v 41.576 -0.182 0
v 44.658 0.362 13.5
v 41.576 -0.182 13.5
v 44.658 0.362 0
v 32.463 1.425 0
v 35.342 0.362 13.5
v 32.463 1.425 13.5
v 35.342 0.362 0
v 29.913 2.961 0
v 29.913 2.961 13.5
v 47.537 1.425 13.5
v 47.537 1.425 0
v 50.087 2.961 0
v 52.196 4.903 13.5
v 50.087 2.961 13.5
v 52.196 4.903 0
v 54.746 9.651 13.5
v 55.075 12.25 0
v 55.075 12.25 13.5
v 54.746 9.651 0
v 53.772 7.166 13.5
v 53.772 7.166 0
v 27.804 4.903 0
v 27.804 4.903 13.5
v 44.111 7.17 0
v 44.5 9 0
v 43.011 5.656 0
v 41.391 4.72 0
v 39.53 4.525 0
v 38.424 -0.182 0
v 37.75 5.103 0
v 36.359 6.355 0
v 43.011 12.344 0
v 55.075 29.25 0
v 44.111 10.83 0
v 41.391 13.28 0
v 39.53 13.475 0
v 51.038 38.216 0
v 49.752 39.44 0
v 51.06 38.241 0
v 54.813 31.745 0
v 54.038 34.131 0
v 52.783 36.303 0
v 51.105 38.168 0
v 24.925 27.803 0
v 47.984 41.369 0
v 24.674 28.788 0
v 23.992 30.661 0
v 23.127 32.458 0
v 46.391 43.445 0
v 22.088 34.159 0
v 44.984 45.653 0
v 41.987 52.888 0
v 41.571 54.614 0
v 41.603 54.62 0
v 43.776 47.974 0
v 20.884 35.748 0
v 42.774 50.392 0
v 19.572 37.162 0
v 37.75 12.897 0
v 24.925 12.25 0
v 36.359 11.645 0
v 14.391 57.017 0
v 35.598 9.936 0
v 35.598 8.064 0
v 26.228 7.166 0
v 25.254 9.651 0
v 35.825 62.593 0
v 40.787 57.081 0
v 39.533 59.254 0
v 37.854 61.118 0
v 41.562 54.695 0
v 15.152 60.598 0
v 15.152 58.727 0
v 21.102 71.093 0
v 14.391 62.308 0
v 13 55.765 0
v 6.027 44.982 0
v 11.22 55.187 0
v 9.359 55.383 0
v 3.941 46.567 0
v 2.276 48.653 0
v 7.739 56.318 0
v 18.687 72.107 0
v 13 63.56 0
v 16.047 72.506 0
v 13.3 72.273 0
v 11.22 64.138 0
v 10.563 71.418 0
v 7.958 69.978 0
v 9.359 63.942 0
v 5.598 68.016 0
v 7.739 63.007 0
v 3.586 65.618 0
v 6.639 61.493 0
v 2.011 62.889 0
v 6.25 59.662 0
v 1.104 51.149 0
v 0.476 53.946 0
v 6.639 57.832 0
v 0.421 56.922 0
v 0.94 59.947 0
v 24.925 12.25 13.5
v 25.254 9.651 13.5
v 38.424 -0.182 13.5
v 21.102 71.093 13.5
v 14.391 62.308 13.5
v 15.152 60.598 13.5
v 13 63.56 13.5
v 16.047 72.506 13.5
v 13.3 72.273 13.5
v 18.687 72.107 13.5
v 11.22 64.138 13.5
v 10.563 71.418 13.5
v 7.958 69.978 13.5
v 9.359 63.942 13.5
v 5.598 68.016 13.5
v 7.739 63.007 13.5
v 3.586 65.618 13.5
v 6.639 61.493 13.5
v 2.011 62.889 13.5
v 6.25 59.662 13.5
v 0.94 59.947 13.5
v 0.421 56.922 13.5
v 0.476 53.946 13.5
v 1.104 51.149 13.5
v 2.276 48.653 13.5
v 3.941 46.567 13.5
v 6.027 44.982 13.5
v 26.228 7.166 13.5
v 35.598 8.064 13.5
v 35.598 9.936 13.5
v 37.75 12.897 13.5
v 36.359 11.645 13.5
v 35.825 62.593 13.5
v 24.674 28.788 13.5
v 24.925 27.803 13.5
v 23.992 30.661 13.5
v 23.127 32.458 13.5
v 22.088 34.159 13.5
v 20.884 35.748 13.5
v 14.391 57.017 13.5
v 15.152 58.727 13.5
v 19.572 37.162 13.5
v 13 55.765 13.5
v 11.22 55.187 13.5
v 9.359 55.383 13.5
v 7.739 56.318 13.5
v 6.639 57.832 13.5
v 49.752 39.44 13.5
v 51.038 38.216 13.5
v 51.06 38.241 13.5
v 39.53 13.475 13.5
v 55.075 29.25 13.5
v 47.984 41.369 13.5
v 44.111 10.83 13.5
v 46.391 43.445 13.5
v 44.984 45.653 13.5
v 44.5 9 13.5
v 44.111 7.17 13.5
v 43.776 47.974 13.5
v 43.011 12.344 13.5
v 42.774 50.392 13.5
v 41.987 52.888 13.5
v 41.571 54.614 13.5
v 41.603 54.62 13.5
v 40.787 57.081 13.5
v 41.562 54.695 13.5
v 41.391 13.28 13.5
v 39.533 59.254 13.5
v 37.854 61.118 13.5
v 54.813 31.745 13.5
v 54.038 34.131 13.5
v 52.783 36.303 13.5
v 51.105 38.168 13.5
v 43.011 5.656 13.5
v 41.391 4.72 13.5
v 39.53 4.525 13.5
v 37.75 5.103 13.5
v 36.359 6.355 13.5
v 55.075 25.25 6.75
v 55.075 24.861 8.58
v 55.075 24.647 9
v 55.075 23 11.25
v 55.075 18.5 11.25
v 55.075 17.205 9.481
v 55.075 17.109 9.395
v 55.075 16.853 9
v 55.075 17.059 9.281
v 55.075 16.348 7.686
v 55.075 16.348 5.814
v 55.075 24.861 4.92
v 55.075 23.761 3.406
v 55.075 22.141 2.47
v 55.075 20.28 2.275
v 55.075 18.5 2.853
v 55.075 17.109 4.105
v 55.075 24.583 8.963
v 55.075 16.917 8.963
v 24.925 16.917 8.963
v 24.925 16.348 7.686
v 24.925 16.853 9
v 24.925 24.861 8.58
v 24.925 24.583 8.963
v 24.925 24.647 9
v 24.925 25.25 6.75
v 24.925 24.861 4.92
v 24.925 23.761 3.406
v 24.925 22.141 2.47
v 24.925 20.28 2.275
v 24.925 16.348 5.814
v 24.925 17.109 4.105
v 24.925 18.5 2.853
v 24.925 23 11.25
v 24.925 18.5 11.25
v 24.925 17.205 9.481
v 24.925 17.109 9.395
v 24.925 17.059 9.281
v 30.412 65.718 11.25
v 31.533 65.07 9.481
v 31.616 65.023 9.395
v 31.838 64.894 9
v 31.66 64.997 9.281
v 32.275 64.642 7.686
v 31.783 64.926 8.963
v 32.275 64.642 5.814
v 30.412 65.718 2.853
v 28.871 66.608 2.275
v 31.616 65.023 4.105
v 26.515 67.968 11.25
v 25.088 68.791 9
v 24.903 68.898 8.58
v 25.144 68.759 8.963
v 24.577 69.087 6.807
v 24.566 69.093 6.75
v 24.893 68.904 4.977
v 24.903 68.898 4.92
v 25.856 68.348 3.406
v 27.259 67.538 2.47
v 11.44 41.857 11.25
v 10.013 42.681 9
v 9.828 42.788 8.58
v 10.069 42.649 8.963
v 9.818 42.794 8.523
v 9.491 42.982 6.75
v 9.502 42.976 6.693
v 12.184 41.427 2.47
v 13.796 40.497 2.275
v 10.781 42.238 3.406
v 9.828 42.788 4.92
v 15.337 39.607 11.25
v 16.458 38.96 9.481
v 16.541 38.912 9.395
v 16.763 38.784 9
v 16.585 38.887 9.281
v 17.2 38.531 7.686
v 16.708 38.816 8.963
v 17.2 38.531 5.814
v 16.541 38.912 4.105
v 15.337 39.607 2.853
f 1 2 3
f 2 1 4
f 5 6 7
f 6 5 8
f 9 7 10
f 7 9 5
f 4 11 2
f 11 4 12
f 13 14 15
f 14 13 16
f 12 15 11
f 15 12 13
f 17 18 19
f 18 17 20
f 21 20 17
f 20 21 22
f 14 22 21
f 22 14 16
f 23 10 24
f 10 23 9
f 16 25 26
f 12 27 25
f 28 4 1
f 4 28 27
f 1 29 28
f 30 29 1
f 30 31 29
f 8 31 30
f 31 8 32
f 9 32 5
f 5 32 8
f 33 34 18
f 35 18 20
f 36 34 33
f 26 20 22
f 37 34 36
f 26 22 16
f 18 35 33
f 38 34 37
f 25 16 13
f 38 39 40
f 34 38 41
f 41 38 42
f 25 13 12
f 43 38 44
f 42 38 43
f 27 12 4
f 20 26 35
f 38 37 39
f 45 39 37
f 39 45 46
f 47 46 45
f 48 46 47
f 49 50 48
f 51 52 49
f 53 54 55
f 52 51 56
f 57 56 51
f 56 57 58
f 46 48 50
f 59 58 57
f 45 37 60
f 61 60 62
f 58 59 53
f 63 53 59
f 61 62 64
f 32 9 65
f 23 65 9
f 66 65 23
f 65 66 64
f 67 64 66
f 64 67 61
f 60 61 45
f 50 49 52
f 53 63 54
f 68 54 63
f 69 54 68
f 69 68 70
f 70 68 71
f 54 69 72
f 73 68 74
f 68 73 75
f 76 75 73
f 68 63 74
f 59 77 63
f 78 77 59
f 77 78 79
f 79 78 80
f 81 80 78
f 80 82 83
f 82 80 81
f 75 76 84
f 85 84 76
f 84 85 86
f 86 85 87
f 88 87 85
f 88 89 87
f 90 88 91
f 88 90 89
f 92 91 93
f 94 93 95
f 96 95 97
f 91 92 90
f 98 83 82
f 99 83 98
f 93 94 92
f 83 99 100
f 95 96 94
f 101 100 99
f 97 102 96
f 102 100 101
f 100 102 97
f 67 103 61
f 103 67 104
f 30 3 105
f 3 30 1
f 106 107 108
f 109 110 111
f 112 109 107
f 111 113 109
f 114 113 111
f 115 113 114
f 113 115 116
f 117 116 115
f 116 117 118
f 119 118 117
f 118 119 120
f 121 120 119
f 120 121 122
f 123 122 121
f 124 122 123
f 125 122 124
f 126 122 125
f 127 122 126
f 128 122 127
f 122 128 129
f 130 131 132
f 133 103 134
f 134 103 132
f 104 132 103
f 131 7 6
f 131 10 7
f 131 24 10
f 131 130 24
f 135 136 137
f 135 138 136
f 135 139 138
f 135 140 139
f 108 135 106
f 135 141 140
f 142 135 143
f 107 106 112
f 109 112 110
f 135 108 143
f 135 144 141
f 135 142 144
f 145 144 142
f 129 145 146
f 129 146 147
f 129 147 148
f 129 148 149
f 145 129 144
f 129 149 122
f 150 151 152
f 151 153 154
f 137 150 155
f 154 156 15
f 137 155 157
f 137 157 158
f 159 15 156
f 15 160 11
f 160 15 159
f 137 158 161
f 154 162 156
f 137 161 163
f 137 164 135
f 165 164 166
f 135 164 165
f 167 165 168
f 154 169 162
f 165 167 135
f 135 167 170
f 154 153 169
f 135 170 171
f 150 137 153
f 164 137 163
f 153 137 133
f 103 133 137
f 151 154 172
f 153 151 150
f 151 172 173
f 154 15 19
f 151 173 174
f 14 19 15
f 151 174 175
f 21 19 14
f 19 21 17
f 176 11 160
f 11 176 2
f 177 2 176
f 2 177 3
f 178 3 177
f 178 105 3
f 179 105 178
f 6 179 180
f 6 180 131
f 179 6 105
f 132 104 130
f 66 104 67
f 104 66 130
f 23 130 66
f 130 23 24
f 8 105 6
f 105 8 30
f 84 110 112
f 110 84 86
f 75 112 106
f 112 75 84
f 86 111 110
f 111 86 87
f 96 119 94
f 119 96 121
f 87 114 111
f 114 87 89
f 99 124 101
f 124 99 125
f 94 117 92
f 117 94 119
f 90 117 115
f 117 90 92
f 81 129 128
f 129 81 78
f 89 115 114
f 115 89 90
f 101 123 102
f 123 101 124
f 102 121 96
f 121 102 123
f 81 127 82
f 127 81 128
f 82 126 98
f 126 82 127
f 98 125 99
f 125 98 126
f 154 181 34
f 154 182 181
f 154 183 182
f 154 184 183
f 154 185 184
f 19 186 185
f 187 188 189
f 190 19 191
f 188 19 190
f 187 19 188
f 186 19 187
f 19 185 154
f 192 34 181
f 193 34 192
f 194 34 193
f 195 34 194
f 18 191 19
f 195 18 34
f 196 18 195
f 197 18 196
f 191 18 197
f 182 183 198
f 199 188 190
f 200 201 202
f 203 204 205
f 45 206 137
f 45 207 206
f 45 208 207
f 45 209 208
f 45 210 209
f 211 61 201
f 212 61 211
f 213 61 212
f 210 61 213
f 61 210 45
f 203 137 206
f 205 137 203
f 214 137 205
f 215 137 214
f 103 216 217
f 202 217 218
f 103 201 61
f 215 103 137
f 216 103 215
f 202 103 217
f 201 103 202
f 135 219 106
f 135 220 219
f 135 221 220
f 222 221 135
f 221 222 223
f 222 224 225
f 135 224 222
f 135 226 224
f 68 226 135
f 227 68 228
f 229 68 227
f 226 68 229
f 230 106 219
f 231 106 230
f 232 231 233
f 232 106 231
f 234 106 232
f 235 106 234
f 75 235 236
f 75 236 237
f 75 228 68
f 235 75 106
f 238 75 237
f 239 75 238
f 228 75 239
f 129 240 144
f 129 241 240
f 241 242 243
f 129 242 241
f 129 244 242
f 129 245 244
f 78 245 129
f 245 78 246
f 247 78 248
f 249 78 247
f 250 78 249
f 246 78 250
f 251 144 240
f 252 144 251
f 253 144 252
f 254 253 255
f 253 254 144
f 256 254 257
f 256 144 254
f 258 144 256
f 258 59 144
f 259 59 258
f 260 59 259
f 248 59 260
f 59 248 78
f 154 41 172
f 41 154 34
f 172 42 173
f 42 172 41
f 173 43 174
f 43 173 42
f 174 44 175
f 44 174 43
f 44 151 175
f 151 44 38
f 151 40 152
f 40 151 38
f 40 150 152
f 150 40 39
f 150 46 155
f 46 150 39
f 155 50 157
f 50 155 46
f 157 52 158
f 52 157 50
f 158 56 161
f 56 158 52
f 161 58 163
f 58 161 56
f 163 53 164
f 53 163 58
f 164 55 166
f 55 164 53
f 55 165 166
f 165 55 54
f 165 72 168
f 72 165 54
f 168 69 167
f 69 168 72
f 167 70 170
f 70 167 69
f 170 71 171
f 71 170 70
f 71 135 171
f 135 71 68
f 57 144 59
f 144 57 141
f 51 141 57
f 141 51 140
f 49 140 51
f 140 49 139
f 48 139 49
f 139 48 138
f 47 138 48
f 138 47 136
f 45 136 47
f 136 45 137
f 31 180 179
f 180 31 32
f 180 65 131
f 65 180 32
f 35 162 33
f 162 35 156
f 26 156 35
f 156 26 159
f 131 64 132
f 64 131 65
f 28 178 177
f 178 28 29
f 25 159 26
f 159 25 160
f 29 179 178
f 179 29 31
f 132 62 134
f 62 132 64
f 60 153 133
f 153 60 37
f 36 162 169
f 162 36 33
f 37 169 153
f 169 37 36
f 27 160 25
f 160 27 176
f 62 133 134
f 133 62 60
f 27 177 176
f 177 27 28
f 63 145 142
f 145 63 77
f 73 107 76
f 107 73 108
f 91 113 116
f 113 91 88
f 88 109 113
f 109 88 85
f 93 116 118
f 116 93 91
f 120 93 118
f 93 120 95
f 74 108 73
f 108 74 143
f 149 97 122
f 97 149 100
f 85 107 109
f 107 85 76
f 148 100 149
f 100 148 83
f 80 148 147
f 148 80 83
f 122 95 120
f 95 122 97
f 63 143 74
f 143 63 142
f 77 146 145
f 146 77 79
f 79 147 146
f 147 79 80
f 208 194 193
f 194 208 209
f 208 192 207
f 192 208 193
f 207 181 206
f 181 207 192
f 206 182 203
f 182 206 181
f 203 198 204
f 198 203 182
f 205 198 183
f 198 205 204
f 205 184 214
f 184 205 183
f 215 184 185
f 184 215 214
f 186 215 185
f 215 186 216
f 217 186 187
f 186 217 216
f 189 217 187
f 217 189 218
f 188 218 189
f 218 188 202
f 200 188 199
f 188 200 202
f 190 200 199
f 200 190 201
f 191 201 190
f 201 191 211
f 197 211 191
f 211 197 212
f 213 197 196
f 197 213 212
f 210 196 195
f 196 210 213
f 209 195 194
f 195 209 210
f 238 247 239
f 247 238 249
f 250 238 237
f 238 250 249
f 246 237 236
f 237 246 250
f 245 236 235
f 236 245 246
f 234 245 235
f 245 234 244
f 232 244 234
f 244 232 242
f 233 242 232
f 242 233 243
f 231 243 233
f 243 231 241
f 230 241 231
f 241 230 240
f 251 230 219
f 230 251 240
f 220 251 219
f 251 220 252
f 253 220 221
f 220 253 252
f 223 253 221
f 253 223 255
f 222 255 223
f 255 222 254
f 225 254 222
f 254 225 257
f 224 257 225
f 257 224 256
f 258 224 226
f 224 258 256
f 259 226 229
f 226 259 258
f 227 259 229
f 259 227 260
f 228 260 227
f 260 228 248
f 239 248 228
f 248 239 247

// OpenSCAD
// file: functions.scad
// PRUSA Mendel  
// Functions used in many files
// GNU GPL v2
// Josef Průša
// josefprusa@me.com
// prusadjs.cz
// http://www.reprap.org/wiki/Prusa_Mendel
// http://github.com/prusajr/PrusaMendel

module nut( d, h, horizontal = true )
{
	cornerdiameter = ( d / 2 ) / cos( 180 / 6 );
	cylinder( h = h, r = cornerdiameter, $fn = 6 );
	if( horizontal )
	{
		for( i = [1 : 6] )
		{
			rotate( [0, 0, 60 * i] ) translate( [-cornerdiameter - 0.2, 0, 0] ) rotate( [0, 0, -45] ) cube( size = [2, 2, h] );
		}
	}
}

// By nophead
module polyhole( d, h ) 
{
	n = max( round( 2 * d ), 3 );
	rotate( [0, 0, 180] ) cylinder( h = h, r = ( d / 2 ) / cos( 180 / n ), $fn = n );
}

module roundcorner( diameter )
{
	difference()
	{
		cube( size = [diameter, diameter, 99], center = false );
		translate( v = [diameter, diameter, 0] ) cylinder( h = 100, r = diameter, center = true );
	}
}
// file: metric.scad
// PRUSA Mendel  
// Default metric sizes
// GNU GPL v2
// Josef Průša
// josefprusa@me.com
// prusadjs.cz
// http://www.reprap.org/wiki/Prusa_Mendel
// http://github.com/prusajr/PrusaMendel

// DONT CHANGE THIS FILE! ALTER VALUES IN CONFIGURATION.SCAD INSTEAD

// RODS

threaded_rod_diameter = 8.2;
threaded_rod_diameter_horizontal = 8.2;
smooth_bar_diameter = 8;
smooth_bar_diameter_horizontal = 8.5;

// Nuts and bolts

m8_diameter = 9;
m8_nut_diameter = 16.4;

m4_diameter = 4.5;
m4_nut_diameter = 9;

m3_diameter = 3.6;
m3_nut_diameter = 6.1;

// Bushing holder

bushing_core_diameter = smooth_bar_diameter;
bushing_material_thickness = 1;

// Motors

motor_shaft = 5.5;
// file: configuration.scad
// PRUSA Mendel  
// Configuration file
// GNU GPL v2
// Josef Průša
// josefprusa@me.com
// prusadjs.cz
// http://www.reprap.org/wiki/Prusa_Mendel
// http://github.com/prusajr/PrusaMendel

// PLEASE SELECT ONE OF THE CONFIGURATIONS BELOW
// BY UN-COMMENTING IT

// Uncomment for metric settings
// METRIC METRIC METRIC METRIC METRIC METRIC METRIC METRIC 

include <metric.scad>;

// Uncomment for imperial settings
// IMPERIAL IMPERIAL IMPERIAL IMPERIAL IMPERIAL IMPERIAL IMPERIAL 

//include <sae.scad>;

// CUSTOM CUSTOM CUSTOM CUSTOM CUSTOM CUSTOM CUSTOM CUSTOM CUSTOM

// Thin walls
layer_height = 0.3;
wot = 1.5;
filament_width = layer_height * wot;

thin_wall = 4 * layer_height * wot;

// LM8UU
linear = true;
linear_bearing_diameter = 15;
linear_bearing_length = 24;

//608 bearing
bearing_diameter = 22;
bearing_thickness = 7;

//Timing belt
belt_pitch = 5;

// CHANGE ONLY THE STUFF YOU KNOW
// IT WILL REPLACE DEFAULT SETTING

// RODS

// threaded_rod_diameter = 0;
// threaded_rod_diameter_horizontal = 0;
// smooth_bar_díameter = 0;
// smooth_bar_díameter_horizontal = 0;

// Nuts and bolts

// m8_diameter = 0;
// m8_nut_diameter = 0;
// m8_nut_thickness = 0;

// m4_diameter = 0;
 m4_nut_diameter = 8.5;
// m4_nut_thickness = 0;

// m3_diameter = 0;
// m3_nut_diameter = 0;
m3_nut_thickness = 3;

// Bushing holder

// bushing_core_diameter = smooth_bar_díameter;
// bushing_material_thickness = 0;

///counted stuff
m3_nut_diameter_bigger = ( ( m3_nut_diameter  / 2) / cos( 180 / 6 ) ) * 2;

// functions 
include <functions.scad>
// main file
// PRUSA Mendel  
// Frame vertex
// GNU GPL v2
// Greg Frost
// http://www.reprap.org/wiki/Prusa_Mendel
// http://github.com/prusajr/PrusaMendel

// Based on http://www.thingiverse.com/thing:2003 aka Viks footed 
// frame vertex, which is based on http://www.thingiverse.com/thing:1780 
// aka Tonokps parametric frame vertex
// Thank you guys for your great work

include <configuration.scad>

/**
 * @id frame-vertex
 * @name Frame vertex
 * @category Printed
 * @link frame-vertex
 * @using 8 m8nut
 * @using 8 m8washer
 */
/**
 * @id frame-vertex-foot
 * @name Frame vertex with foot
 * @category Printed
 * @link frame-vertex-foot
 * @using 8 m8nut
 * @using 8 m8washer
 */

basefoot = false;

vertex( with_foot = basefoot );

// Commented out TVRRUG logo

//difference()
//{
//	vertex( with_foot = basefoot );
//	rotate( [0, 0, 120] )
//	{
//		translate( [-2.5, -55, 12.5] )
//		{
//			scale( [0.75, 0.75, 1] )
//			{
//				linear_extrude( file = "TVRR.dxf",  height = 5 );
//			}
//		}
//	}
//}


//import_stl( "frame-vertex.stl" );

//teardrop();

module teardrop( r = 8, h = 20 )
{
	rotate( [-270, 0, 90] )
	linear_extrude( height = h )
	{
		circle( r = r );
		polygon( points = [[0, 0], [r * cos( 30 ), r * sin( 30 ) ], [0.5 * r, r], [-0.5 * r, r], [-r * cos( 30 ), r * sin( 30 ) ]],
				paths = [[0, 1, 2, 3, 4]] );
	}
}

vfvertex_height = m8_diameter + 4.5;

hole_separation = 58.5;
vertex_end_major_d = 30.15;
vertex_end_minor_d = 18.5;
vertex_horizontal_hole_offset = 11.75;
hole_flat_radius = 8.5; // flat surface around holes.
foot_depth = 26.25;
end_round_translation = vertex_horizontal_hole_offset - hole_flat_radius;

module vertex( with_foot = true )
{
	peg_r = 12;
	peg1 = [hole_separation + vertex_end_major_d / 2 - peg_r,
		vertex_horizontal_hole_offset + hole_flat_radius];
	peg2 = rotate_vec( [hole_separation + vertex_end_major_d / 2 - peg_r,
		-vertex_horizontal_hole_offset - hole_flat_radius], 60 );

	inner_peg_r = 12;
	peg3 = [hole_separation - vertex_end_major_d / 2 + inner_peg_r,
		vertex_horizontal_hole_offset + hole_flat_radius];
	peg4 = rotate_vec( [hole_separation - vertex_end_major_d / 2 + inner_peg_r,
		-vertex_horizontal_hole_offset - hole_flat_radius], 60 );

	a1_r = 11;
	a2_r = 11;
	a3_r = 3;
	a4_r = 3;

	a1 = [hole_separation - vertex_end_major_d / 2 + a1_r,
		vertex_horizontal_hole_offset - hole_flat_radius];
	a2 = [hole_separation + vertex_end_major_d / 2 - a2_r,
		vertex_horizontal_hole_offset - hole_flat_radius];
	a3 = [hole_separation - vertex_end_major_d / 2 + a1_r, -foot_depth + a3_r];
	a4 = [hole_separation + vertex_end_major_d / 2 - a2_r, -foot_depth + a4_r];

//	translate( [-hole_separation - vertex_end_major_d / 2, -vertex_horizontal_hole_offset, -vfvertex_height / 2] )
	translate( [-18.5, 9, 0] )
	difference()
	{
		union()
		{
			for ( hole = [( with_foot ? 1 : 0 ) : 1] )
			rotate( hole * 60 )
			translate ( [hole_separation, end_round_translation-hole * 2 * end_round_translation, 0] )
			scale( [1, ( vertex_end_minor_d + 2 * end_round_translation ) / vertex_end_major_d, 1] )
			cylinder( r = vertex_end_major_d / 2, h = vfvertex_height ); 

			for ( block = [0 : 1] )
			rotate( block * 60 )
			translate( [hole_separation,
				vertex_horizontal_hole_offset - block * 2 * vertex_horizontal_hole_offset,
				vfvertex_height / 2] )
			cube( [vertex_end_major_d,
				2 * hole_flat_radius, vfvertex_height], center = true );

			linear_extrude( height = vfvertex_height )
			{
				// The outer curve.
				barbell( peg1, peg2, peg_r, peg_r, 200, 30 );
				// The inner curve.
				barbell( peg3, peg4, inner_peg_r, inner_peg_r, 20, 200 );

				if ( with_foot )
				{
					// Curves for the feet
					barbell( a1, a3, a1_r, a3_r, 200, 20 );
					barbell( a2, a4, a2_r, a4_r, 20, 200 );


					// The flat bit on the bottom of the foot.
					polygon( points = [a3 + [0, -a3_r], a4 + [0, -a4_r], ( a3 + a4 ) / 2 + [0, 5]],
						paths=[[0, 1, 2]] );
				}
			}
		}

		for ( hole = [0 : 1] )
		rotate( hole * 60 )
		translate( [hole_separation, 0, -1] )
		cylinder( h = vfvertex_height + 2, r = ( m8_diameter / 2 ) ); 

		for ( block = [0 : 1] )
		rotate( block * 60 )
		translate( [hole_separation - vertex_end_major_d / 2 - 1,
			vertex_horizontal_hole_offset - 2 * block * vertex_horizontal_hole_offset,
			vfvertex_height / 2] )
		teardrop( r = m8_diameter / 2, h = vertex_end_major_d + 2 );
	}
}

module barbell ( x1, x2, r1, r2, r3, r4 ) 
{
	x3 = triangulate ( x1, x2, r1 + r3, r2 + r3 );
	x4 = triangulate ( x2, x1, r2 + r4, r1 + r4 );
	render()
	difference()
	{
		union()
		{
			translate( x1 )
			circle ( r = r1 );
			translate( x2 )
			circle( r = r2 );
			polygon( points = [ x1, x3, x2, x4] );
		}
		translate( x3 )
		circle( r = r3, $fa = 5 );
		translate( x4 )
		circle( r = r4, $fa = 5 );
	}
}

function triangulate ( point1, point2, length1, length2 ) = 
point1 + 
length1 * rotated(
atan2( point2[1] - point1[1], point2[0] - point1[0]) +
angle( distance( point1, point2 ), length1, length2 ) );

function distance( point1, point2 ) =
sqrt( ( point1[0] - point2[0] ) * ( point1[0] - point2[0] ) +
( point1[1] - point2[1] ) * ( point1[1] - point2[1] ) );

function angle( a, b, c) = acos(( a * a + b * b - c * c ) / ( 2 * a * b ) ); 

function rotated( a ) = [cos( a ), sin( a ), 0];
function rotate_vec( v, a ) = [cos( a ) * v[0] - sin( a ) * v[1], sin( a ) * v[0] + cos( a ) * v[1]];
